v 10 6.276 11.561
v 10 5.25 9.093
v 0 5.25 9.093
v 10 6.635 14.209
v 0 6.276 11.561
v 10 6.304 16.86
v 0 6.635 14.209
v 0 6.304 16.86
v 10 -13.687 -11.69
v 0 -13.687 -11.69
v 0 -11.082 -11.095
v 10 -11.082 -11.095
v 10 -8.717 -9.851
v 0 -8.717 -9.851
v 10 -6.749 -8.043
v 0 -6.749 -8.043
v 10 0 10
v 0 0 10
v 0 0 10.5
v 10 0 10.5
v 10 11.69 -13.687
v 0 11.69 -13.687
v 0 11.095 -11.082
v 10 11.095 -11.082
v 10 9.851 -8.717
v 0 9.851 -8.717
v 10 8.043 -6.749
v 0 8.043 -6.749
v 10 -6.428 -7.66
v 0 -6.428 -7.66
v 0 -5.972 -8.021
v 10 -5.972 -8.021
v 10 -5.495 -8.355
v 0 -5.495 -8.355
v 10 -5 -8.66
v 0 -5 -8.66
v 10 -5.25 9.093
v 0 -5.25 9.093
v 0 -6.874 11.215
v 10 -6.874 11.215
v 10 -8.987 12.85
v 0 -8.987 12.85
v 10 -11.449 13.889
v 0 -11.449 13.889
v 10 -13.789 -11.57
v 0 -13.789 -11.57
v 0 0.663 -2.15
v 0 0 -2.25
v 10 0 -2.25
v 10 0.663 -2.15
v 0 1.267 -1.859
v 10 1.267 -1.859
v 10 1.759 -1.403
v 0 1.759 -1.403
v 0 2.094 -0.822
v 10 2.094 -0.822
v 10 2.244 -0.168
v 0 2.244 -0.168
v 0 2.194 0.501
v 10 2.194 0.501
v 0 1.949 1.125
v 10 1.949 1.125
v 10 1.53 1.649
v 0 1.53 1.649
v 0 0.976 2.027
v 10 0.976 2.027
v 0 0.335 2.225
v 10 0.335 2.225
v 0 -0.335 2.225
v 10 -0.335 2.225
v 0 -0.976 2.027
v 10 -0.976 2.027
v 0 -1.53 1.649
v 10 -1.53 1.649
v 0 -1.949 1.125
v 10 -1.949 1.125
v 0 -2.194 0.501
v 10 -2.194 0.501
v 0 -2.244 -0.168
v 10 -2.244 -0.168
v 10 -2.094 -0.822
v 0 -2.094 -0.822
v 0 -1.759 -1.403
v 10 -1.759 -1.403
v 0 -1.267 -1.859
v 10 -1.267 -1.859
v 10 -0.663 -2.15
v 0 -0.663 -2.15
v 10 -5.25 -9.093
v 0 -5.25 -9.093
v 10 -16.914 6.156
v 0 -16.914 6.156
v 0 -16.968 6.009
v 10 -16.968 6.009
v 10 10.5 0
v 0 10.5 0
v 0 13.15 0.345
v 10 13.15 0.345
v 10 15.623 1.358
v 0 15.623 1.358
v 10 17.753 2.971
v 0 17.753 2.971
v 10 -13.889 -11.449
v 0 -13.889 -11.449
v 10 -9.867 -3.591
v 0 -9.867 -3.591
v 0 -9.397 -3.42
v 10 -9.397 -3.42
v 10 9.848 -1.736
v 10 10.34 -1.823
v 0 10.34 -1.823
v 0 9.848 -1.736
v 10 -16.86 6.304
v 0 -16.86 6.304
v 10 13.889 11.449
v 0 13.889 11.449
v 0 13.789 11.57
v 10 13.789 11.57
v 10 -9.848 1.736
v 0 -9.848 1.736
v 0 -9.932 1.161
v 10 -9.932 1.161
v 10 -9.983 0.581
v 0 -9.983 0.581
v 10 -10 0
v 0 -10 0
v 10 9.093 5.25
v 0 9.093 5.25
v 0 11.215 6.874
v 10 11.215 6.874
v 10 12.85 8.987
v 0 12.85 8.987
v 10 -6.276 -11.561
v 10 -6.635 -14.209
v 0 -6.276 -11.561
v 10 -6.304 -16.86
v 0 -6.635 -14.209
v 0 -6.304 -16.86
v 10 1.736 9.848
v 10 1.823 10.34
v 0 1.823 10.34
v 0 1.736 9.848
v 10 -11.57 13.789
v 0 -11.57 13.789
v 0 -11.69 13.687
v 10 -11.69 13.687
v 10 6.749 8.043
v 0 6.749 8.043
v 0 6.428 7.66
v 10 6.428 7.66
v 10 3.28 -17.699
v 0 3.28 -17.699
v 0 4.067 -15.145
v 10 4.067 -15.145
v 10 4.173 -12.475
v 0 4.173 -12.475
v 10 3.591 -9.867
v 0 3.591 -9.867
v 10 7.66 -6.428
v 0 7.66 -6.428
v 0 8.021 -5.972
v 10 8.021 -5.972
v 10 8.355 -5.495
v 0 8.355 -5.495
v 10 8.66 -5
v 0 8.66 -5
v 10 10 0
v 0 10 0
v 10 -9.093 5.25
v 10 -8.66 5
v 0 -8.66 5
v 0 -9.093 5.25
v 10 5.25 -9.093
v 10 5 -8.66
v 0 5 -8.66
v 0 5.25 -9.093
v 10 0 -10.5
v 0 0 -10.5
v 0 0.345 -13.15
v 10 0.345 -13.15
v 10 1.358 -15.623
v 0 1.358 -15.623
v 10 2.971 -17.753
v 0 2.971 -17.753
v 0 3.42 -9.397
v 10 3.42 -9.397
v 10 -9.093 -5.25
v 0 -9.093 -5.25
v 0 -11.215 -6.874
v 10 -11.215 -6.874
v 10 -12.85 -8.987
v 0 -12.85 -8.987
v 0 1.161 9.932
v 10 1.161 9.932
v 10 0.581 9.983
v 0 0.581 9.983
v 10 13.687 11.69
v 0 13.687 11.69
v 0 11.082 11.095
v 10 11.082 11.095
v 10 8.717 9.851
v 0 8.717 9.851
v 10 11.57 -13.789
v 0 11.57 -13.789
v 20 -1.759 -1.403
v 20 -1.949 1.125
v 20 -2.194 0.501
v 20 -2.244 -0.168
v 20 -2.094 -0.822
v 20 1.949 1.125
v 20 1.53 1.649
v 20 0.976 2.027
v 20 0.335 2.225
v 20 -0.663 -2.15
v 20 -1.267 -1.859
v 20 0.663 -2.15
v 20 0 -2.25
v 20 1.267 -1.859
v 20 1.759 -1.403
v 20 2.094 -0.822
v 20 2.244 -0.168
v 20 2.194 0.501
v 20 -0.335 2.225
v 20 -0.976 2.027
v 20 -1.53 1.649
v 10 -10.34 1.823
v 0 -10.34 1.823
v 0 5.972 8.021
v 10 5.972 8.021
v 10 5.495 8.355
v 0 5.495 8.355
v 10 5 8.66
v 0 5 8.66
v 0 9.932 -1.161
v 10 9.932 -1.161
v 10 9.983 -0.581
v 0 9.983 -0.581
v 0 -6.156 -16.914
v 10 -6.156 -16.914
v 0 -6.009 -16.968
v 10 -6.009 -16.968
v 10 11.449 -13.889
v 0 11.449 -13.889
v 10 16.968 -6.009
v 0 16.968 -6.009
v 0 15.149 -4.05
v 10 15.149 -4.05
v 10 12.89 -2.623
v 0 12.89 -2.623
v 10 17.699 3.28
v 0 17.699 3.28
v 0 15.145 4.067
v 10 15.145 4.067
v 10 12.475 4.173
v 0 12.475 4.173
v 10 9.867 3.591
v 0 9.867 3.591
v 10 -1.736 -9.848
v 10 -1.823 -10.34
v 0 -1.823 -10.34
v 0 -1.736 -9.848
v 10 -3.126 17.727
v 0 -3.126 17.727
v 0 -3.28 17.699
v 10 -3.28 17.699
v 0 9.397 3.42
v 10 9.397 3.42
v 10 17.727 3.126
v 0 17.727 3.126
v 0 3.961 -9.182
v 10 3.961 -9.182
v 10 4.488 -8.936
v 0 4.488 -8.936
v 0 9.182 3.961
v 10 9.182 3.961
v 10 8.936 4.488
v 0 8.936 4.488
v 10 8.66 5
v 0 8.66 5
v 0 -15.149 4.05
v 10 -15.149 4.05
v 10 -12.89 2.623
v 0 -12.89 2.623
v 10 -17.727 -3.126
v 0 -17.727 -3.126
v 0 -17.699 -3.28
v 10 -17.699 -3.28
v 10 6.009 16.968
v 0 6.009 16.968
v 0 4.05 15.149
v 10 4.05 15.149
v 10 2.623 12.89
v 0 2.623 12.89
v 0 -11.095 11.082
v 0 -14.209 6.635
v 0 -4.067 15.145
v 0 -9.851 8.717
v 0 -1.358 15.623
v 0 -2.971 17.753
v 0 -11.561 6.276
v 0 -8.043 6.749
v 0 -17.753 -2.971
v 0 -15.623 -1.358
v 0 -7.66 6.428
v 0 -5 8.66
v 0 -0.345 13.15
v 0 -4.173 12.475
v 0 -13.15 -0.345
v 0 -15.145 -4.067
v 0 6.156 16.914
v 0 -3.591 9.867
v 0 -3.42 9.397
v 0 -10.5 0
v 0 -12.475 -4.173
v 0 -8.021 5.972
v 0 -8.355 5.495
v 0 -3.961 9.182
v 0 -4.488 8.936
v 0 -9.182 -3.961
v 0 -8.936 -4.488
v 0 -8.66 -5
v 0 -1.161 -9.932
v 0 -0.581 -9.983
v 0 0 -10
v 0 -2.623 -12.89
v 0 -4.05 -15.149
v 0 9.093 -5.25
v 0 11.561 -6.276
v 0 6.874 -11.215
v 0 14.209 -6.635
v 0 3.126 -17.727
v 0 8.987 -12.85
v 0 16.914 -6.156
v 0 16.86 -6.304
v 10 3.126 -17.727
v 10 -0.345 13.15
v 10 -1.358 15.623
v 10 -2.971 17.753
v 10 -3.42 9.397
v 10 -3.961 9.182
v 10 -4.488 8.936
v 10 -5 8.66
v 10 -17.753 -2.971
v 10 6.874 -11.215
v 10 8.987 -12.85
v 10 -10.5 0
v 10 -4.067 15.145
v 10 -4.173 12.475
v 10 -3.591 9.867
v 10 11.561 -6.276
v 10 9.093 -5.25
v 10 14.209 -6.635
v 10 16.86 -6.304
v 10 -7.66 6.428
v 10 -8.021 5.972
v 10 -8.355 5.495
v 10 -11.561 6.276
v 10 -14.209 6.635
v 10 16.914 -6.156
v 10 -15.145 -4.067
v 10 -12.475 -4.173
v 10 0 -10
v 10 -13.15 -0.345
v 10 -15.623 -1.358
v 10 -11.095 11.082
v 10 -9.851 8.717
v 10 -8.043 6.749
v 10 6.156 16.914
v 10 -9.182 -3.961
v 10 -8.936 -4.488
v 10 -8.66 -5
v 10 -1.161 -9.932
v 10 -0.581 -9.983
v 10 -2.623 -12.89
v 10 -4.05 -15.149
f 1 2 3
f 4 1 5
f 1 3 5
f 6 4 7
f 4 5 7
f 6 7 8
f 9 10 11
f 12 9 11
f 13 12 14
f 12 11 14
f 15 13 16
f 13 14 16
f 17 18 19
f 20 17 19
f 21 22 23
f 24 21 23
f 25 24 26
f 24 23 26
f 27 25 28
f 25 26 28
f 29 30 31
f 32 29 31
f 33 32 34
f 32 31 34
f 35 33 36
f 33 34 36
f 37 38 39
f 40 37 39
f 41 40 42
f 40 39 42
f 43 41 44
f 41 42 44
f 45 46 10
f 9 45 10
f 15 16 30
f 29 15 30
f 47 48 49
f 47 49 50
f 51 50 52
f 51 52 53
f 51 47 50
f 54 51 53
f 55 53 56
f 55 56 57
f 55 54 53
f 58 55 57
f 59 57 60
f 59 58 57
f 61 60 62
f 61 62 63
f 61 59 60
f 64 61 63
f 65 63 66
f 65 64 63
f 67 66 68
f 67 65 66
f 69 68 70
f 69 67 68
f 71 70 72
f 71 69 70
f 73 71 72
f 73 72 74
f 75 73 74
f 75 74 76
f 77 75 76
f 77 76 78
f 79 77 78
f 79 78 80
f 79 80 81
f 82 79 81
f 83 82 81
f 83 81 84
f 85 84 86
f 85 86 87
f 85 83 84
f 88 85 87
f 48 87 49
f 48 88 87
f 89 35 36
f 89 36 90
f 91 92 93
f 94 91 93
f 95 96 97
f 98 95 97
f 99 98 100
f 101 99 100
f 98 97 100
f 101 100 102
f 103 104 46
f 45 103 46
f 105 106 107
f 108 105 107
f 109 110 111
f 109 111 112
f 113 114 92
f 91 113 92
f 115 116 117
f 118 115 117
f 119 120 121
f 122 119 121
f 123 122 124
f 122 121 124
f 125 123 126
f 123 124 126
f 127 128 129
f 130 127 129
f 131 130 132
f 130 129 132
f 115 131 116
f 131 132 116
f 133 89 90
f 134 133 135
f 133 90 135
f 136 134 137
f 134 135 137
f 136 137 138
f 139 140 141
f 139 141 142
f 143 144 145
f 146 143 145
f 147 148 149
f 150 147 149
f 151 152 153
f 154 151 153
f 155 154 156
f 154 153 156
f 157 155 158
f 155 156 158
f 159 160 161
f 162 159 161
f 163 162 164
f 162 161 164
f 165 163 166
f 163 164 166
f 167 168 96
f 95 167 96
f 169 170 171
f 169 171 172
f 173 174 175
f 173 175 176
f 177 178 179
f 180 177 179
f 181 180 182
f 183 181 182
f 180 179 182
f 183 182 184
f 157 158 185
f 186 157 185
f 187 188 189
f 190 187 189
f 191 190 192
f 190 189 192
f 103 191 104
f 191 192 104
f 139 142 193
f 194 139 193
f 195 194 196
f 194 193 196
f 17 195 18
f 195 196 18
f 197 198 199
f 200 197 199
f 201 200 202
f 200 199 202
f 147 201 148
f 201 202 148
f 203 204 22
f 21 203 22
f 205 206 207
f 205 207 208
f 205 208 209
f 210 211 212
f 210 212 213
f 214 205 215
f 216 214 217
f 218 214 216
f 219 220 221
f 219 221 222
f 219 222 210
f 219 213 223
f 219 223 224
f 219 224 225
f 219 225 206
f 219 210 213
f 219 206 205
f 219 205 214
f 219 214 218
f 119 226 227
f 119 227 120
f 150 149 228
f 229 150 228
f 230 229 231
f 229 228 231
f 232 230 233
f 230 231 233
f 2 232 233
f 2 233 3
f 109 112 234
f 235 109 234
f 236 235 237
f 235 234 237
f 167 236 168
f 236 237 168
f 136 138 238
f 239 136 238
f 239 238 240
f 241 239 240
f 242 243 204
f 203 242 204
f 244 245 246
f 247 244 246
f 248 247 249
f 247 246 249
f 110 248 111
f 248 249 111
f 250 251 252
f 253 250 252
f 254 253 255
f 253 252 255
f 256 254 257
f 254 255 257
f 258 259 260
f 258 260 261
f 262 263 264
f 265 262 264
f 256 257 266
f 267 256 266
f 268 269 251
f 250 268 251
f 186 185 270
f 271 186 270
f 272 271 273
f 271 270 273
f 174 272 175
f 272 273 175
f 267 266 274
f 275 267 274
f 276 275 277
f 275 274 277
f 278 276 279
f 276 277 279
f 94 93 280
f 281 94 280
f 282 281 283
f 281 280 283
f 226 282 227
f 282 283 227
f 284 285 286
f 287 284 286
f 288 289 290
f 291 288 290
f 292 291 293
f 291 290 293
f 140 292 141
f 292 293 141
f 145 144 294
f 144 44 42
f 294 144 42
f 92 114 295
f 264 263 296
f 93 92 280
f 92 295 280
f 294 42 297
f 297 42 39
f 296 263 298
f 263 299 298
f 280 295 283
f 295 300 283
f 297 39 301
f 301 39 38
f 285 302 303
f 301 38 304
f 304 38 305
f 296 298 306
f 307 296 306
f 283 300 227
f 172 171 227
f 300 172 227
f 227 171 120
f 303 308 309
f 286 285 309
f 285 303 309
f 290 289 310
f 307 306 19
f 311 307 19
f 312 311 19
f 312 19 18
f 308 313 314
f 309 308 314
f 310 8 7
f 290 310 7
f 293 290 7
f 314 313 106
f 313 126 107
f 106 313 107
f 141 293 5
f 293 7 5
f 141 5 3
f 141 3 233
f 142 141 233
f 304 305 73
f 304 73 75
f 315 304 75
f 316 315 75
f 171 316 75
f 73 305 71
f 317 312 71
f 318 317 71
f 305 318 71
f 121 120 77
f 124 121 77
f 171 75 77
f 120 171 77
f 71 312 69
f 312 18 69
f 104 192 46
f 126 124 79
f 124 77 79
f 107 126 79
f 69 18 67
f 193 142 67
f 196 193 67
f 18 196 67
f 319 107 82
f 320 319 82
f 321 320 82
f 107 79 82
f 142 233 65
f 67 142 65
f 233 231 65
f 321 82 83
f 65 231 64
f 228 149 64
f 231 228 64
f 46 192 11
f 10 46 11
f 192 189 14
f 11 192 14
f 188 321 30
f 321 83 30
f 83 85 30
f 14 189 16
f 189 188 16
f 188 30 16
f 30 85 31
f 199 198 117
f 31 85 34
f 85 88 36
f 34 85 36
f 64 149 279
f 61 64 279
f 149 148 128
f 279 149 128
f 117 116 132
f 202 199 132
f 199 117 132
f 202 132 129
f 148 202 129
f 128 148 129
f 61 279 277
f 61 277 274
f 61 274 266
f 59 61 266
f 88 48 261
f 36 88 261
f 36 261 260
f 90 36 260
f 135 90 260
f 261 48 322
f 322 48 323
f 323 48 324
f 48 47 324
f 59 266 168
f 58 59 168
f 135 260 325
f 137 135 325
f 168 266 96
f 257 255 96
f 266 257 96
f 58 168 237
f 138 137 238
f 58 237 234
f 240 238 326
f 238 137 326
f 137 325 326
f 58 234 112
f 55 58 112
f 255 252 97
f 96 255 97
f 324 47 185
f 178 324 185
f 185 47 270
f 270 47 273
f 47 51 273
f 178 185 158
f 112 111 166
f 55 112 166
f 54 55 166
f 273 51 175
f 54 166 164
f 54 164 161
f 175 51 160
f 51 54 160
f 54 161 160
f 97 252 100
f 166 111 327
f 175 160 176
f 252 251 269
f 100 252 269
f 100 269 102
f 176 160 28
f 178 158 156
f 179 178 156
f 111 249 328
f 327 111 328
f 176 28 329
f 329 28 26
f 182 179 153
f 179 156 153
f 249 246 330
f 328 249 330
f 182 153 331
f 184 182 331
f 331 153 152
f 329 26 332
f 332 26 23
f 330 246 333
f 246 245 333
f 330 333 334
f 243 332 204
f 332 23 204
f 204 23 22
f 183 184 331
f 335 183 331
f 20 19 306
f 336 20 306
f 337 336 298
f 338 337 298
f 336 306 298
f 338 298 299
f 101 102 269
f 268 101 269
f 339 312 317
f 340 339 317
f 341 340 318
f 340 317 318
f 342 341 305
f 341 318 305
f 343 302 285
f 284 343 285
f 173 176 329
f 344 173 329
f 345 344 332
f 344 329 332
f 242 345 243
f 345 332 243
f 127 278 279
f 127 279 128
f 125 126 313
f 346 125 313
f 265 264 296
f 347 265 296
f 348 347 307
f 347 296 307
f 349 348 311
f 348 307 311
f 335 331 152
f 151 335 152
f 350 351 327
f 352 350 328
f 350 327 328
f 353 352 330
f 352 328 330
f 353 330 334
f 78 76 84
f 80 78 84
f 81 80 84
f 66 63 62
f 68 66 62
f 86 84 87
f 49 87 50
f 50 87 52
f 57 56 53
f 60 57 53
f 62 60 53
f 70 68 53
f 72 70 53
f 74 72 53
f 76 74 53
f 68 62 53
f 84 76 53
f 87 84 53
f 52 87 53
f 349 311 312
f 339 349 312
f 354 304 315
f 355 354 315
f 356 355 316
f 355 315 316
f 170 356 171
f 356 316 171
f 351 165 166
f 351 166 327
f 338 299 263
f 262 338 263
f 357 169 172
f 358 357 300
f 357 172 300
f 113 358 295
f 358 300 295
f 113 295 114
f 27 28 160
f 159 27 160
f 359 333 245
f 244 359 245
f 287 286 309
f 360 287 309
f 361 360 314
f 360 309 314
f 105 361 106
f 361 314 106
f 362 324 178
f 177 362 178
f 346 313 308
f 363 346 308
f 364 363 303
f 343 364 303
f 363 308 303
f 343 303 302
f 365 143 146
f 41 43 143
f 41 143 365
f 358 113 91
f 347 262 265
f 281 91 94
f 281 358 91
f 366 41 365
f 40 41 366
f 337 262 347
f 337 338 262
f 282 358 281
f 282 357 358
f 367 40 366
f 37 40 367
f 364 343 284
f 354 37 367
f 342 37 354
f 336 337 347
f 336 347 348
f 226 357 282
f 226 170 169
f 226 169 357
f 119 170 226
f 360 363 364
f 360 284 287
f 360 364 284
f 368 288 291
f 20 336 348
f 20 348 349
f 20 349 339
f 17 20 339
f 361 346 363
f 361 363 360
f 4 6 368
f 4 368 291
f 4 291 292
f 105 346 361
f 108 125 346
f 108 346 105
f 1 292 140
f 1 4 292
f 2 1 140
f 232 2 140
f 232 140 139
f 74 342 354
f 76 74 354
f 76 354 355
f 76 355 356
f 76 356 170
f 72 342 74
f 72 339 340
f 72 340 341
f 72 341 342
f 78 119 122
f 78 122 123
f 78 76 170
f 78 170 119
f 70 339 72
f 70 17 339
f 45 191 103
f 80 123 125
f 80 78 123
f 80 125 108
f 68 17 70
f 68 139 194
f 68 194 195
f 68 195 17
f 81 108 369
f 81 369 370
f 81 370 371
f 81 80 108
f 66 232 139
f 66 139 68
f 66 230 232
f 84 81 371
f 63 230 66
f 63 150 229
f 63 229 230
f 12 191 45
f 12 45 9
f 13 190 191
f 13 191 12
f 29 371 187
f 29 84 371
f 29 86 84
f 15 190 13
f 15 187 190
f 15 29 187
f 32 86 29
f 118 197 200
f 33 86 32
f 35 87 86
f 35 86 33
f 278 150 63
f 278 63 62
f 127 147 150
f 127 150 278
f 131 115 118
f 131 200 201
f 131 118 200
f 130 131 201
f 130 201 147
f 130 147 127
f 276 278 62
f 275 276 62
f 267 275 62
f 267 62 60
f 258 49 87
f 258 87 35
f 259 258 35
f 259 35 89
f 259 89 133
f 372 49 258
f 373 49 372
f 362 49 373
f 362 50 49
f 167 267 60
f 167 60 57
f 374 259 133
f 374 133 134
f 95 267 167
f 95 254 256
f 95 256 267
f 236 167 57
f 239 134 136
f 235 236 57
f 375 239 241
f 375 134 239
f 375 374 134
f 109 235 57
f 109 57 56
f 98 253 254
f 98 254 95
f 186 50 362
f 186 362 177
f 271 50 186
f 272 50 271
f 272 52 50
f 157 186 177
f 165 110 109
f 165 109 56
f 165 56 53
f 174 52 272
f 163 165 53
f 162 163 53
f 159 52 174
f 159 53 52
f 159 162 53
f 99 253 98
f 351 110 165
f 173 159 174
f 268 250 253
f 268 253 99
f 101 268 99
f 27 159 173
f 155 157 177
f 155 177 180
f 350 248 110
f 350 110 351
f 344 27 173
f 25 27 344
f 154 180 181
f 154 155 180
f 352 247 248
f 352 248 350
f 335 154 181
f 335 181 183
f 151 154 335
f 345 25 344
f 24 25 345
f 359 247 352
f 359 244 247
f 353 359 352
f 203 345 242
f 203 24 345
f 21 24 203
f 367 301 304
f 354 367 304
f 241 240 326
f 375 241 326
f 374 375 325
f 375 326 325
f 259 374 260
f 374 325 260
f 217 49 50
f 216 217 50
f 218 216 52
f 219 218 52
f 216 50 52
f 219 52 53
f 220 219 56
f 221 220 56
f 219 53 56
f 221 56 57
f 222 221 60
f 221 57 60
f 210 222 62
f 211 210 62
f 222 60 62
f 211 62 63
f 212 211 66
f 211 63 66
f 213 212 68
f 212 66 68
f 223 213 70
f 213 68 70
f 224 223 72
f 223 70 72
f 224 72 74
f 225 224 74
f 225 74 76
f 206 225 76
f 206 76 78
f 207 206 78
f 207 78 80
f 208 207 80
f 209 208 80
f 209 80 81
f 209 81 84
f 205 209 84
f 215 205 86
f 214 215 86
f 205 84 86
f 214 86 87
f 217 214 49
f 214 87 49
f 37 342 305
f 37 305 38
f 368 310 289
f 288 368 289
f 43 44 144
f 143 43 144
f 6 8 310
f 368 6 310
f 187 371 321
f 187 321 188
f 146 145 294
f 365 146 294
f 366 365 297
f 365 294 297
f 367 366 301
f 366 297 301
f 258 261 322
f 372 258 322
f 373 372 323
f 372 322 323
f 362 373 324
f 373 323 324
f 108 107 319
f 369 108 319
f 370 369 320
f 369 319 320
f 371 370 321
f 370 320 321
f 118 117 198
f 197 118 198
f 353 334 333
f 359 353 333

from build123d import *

# Parameters (mm, degrees)
SKETCH1_R           = 2.25
BOSS_EXTRUDE2_DEPTH = 10
SKETCH2_R           = 2.25
BOSS_EXTRUDE3_DEPTH = 10


with BuildPart() as part:
    # Sketch1 → Boss-Extrude2 (new body)
    with BuildSketch(Plane(origin=(0, 0, 0), x_dir=(0, 0, -1), z_dir=(1, 0, 0))):
        with BuildLine():
            Line((9.866772518, 3.591211505), (9.396926208, 3.420201433))
            ThreePointArc((9.396926208, 3.420201433), (9.06307787, 4.226182617), (8.660254038, 5))
            Line((8.660254038, 5), (9.09326674, 5.25))
            ThreePointArc((9.09326674, 5.25), (12.101465931, 7.877633315), (13.889242501, 11.449407965))
            Line((13.889242501, 11.449407965), (13.788799976, 11.570176974))
            Line((13.788799976, 11.570176974), (13.687307381, 11.69006487))
            ThreePointArc((13.687307381, 11.69006487), (9.85935187, 10.549680802), (6.749269902, 8.043466653))
            Line((6.749269902, 8.043466653), (6.427876097, 7.660444431))
            ThreePointArc((6.427876097, 7.660444431), (5.735764364, 8.191520443), (5, 8.660254038))
            Line((5, 8.660254038), (5.25, 9.09326674))
            ThreePointArc((5.25, 9.09326674), (6.541360261, 12.872963538), (6.303732863, 16.860099406))
            Line((6.303732863, 16.860099406), (6.15636258, 16.914467174))
            Line((6.15636258, 16.914467174), (6.008523466, 16.96754684))
            ThreePointArc((6.008523466, 16.96754684), (3.263608784, 14.065967511), (1.823305866, 10.340481407))
            Line((1.823305866, 10.340481407), (1.736481777, 9.84807753))
            ThreePointArc((1.736481777, 9.84807753), (0.871557427, 9.961946981), (0, 10))
            Line((0, 10), (0, 10.5))
            ThreePointArc((0, 10.5), (-0.771497607, 14.418993577), (-2.970856905, 17.753140828))
            Line((-2.970856905, 17.753140828), (-3.125667198, 17.726539554))
            Line((-3.125667198, 17.726539554), (-3.280239459, 17.698588336))
            ThreePointArc((-3.280239459, 17.698588336), (-4.206615641, 13.813289585), (-3.591211505, 9.866772518))
            Line((-3.591211505, 9.866772518), (-3.420201433, 9.396926208))
            ThreePointArc((-3.420201433, 9.396926208), (-4.226182617, 9.06307787), (-5, 8.660254038))
            Line((-5, 8.660254038), (-5.25, 9.09326674))
            ThreePointArc((-5.25, 9.09326674), (-7.877633315, 12.101465931), (-11.449407965, 13.889242501))
            Line((-11.449407965, 13.889242501), (-11.570176974, 13.788799976))
            Line((-11.570176974, 13.788799976), (-11.69006487, 13.687307381))
            ThreePointArc((-11.69006487, 13.687307381), (-10.549680802, 9.85935187), (-8.043466653, 6.749269902))
            Line((-8.043466653, 6.749269902), (-7.660444431, 6.427876097))
            ThreePointArc((-7.660444431, 6.427876097), (-8.191520443, 5.735764364), (-8.660254038, 5))
            Line((-8.660254038, 5), (-9.09326674, 5.25))
            ThreePointArc((-9.09326674, 5.25), (-12.872963538, 6.541360261), (-16.860099406, 6.303732863))
            Line((-16.860099406, 6.303732863), (-16.914467174, 6.15636258))
            Line((-16.914467174, 6.15636258), (-16.96754684, 6.008523466))
            ThreePointArc((-16.96754684, 6.008523466), (-14.065967511, 3.263608784), (-10.340481407, 1.823305866))
            Line((-10.340481407, 1.823305866), (-9.84807753, 1.736481777))
            ThreePointArc((-9.84807753, 1.736481777), (-9.961946981, 0.871557427), (-10, 0))
            Line((-10, 0), (-10.5, 0))
            ThreePointArc((-10.5, 0), (-14.418993577, -0.771497607), (-17.753140828, -2.970856905))
            Line((-17.753140828, -2.970856905), (-17.726539554, -3.125667198))
            Line((-17.726539554, -3.125667198), (-17.698588336, -3.280239459))
            ThreePointArc((-17.698588336, -3.280239459), (-13.813289585, -4.206615641), (-9.866772518, -3.591211505))
            Line((-9.866772518, -3.591211505), (-9.396926208, -3.420201433))
            ThreePointArc((-9.396926208, -3.420201433), (-9.06307787, -4.226182617), (-8.660254038, -5))
            Line((-8.660254038, -5), (-9.09326674, -5.25))
            ThreePointArc((-9.09326674, -5.25), (-12.101465931, -7.877633315), (-13.889242501, -11.449407965))
            Line((-13.889242501, -11.449407965), (-13.788799976, -11.570176974))
            Line((-13.788799976, -11.570176974), (-13.687307381, -11.69006487))
            ThreePointArc((-13.687307381, -11.69006487), (-9.85935187, -10.549680802), (-6.749269902, -8.043466653))
            Line((-6.749269902, -8.043466653), (-6.427876097, -7.660444431))
            ThreePointArc((-6.427876097, -7.660444431), (-5.735764364, -8.191520443), (-5, -8.660254038))
            Line((-5, -8.660254038), (-5.25, -9.09326674))
            ThreePointArc((-5.25, -9.09326674), (-6.541360261, -12.872963538), (-6.303732863, -16.860099406))
            Line((-6.303732863, -16.860099406), (-6.15636258, -16.914467174))
            Line((-6.15636258, -16.914467174), (-6.008523466, -16.96754684))
            ThreePointArc((-6.008523466, -16.96754684), (-3.263608784, -14.065967511), (-1.823305866, -10.340481407))
            Line((-1.823305866, -10.340481407), (-1.736481777, -9.84807753))
            ThreePointArc((-1.736481777, -9.84807753), (-0.871557427, -9.961946981), (0, -10))
            Line((0, -10), (0, -10.5))
            ThreePointArc((0, -10.5), (0.771497607, -14.418993577), (2.970856905, -17.753140828))
            Line((2.970856905, -17.753140828), (3.125667198, -17.726539554))
            Line((3.125667198, -17.726539554), (3.280239459, -17.698588336))
            ThreePointArc((3.280239459, -17.698588336), (4.206615641, -13.813289585), (3.591211505, -9.866772518))
            Line((3.591211505, -9.866772518), (3.420201433, -9.396926208))
            ThreePointArc((3.420201433, -9.396926208), (4.226182617, -9.06307787), (5, -8.660254038))
            Line((5, -8.660254038), (5.25, -9.09326674))
            ThreePointArc((5.25, -9.09326674), (7.877633315, -12.101465931), (11.449407965, -13.889242501))
            Line((11.449407965, -13.889242501), (11.570176974, -13.788799976))
            Line((11.570176974, -13.788799976), (11.69006487, -13.687307381))
            ThreePointArc((11.69006487, -13.687307381), (10.549680802, -9.85935187), (8.043466653, -6.749269902))
            Line((8.043466653, -6.749269902), (7.660444431, -6.427876097))
            ThreePointArc((7.660444431, -6.427876097), (8.191520443, -5.735764364), (8.660254038, -5))
            Line((8.660254038, -5), (9.09326674, -5.25))
            ThreePointArc((9.09326674, -5.25), (12.872963538, -6.541360261), (16.860099406, -6.303732863))
            Line((16.860099406, -6.303732863), (16.914467174, -6.15636258))
            Line((16.914467174, -6.15636258), (16.96754684, -6.008523466))
            ThreePointArc((16.96754684, -6.008523466), (14.065967511, -3.263608784), (10.340481407, -1.823305866))
            Line((10.340481407, -1.823305866), (9.84807753, -1.736481777))
            ThreePointArc((9.84807753, -1.736481777), (9.961946981, -0.871557427), (10, 0))
            Line((10, 0), (10.5, 0))
            ThreePointArc((10.5, 0), (14.418993577, 0.771497607), (17.753140828, 2.970856905))
            Line((17.753140828, 2.970856905), (17.726539554, 3.125667198))
            Line((17.726539554, 3.125667198), (17.698588336, 3.280239459))
            ThreePointArc((17.698588336, 3.280239459), (13.813289585, 4.206615641), (9.866772518, 3.591211505))
        make_face()
        Circle(SKETCH1_R, mode=Mode.SUBTRACT)
    extrude(amount=BOSS_EXTRUDE2_DEPTH)


with BuildPart() as body_2:
    # Sketch2 → Boss-Extrude3 (new body)
    with BuildSketch(Plane(origin=(10, 0, 0), x_dir=(0, 0, -1), z_dir=(1, 0, 0))):
        Circle(SKETCH2_R)
    extrude(amount=BOSS_EXTRUDE3_DEPTH)


solid = Compound([part.part, body_2.part])
